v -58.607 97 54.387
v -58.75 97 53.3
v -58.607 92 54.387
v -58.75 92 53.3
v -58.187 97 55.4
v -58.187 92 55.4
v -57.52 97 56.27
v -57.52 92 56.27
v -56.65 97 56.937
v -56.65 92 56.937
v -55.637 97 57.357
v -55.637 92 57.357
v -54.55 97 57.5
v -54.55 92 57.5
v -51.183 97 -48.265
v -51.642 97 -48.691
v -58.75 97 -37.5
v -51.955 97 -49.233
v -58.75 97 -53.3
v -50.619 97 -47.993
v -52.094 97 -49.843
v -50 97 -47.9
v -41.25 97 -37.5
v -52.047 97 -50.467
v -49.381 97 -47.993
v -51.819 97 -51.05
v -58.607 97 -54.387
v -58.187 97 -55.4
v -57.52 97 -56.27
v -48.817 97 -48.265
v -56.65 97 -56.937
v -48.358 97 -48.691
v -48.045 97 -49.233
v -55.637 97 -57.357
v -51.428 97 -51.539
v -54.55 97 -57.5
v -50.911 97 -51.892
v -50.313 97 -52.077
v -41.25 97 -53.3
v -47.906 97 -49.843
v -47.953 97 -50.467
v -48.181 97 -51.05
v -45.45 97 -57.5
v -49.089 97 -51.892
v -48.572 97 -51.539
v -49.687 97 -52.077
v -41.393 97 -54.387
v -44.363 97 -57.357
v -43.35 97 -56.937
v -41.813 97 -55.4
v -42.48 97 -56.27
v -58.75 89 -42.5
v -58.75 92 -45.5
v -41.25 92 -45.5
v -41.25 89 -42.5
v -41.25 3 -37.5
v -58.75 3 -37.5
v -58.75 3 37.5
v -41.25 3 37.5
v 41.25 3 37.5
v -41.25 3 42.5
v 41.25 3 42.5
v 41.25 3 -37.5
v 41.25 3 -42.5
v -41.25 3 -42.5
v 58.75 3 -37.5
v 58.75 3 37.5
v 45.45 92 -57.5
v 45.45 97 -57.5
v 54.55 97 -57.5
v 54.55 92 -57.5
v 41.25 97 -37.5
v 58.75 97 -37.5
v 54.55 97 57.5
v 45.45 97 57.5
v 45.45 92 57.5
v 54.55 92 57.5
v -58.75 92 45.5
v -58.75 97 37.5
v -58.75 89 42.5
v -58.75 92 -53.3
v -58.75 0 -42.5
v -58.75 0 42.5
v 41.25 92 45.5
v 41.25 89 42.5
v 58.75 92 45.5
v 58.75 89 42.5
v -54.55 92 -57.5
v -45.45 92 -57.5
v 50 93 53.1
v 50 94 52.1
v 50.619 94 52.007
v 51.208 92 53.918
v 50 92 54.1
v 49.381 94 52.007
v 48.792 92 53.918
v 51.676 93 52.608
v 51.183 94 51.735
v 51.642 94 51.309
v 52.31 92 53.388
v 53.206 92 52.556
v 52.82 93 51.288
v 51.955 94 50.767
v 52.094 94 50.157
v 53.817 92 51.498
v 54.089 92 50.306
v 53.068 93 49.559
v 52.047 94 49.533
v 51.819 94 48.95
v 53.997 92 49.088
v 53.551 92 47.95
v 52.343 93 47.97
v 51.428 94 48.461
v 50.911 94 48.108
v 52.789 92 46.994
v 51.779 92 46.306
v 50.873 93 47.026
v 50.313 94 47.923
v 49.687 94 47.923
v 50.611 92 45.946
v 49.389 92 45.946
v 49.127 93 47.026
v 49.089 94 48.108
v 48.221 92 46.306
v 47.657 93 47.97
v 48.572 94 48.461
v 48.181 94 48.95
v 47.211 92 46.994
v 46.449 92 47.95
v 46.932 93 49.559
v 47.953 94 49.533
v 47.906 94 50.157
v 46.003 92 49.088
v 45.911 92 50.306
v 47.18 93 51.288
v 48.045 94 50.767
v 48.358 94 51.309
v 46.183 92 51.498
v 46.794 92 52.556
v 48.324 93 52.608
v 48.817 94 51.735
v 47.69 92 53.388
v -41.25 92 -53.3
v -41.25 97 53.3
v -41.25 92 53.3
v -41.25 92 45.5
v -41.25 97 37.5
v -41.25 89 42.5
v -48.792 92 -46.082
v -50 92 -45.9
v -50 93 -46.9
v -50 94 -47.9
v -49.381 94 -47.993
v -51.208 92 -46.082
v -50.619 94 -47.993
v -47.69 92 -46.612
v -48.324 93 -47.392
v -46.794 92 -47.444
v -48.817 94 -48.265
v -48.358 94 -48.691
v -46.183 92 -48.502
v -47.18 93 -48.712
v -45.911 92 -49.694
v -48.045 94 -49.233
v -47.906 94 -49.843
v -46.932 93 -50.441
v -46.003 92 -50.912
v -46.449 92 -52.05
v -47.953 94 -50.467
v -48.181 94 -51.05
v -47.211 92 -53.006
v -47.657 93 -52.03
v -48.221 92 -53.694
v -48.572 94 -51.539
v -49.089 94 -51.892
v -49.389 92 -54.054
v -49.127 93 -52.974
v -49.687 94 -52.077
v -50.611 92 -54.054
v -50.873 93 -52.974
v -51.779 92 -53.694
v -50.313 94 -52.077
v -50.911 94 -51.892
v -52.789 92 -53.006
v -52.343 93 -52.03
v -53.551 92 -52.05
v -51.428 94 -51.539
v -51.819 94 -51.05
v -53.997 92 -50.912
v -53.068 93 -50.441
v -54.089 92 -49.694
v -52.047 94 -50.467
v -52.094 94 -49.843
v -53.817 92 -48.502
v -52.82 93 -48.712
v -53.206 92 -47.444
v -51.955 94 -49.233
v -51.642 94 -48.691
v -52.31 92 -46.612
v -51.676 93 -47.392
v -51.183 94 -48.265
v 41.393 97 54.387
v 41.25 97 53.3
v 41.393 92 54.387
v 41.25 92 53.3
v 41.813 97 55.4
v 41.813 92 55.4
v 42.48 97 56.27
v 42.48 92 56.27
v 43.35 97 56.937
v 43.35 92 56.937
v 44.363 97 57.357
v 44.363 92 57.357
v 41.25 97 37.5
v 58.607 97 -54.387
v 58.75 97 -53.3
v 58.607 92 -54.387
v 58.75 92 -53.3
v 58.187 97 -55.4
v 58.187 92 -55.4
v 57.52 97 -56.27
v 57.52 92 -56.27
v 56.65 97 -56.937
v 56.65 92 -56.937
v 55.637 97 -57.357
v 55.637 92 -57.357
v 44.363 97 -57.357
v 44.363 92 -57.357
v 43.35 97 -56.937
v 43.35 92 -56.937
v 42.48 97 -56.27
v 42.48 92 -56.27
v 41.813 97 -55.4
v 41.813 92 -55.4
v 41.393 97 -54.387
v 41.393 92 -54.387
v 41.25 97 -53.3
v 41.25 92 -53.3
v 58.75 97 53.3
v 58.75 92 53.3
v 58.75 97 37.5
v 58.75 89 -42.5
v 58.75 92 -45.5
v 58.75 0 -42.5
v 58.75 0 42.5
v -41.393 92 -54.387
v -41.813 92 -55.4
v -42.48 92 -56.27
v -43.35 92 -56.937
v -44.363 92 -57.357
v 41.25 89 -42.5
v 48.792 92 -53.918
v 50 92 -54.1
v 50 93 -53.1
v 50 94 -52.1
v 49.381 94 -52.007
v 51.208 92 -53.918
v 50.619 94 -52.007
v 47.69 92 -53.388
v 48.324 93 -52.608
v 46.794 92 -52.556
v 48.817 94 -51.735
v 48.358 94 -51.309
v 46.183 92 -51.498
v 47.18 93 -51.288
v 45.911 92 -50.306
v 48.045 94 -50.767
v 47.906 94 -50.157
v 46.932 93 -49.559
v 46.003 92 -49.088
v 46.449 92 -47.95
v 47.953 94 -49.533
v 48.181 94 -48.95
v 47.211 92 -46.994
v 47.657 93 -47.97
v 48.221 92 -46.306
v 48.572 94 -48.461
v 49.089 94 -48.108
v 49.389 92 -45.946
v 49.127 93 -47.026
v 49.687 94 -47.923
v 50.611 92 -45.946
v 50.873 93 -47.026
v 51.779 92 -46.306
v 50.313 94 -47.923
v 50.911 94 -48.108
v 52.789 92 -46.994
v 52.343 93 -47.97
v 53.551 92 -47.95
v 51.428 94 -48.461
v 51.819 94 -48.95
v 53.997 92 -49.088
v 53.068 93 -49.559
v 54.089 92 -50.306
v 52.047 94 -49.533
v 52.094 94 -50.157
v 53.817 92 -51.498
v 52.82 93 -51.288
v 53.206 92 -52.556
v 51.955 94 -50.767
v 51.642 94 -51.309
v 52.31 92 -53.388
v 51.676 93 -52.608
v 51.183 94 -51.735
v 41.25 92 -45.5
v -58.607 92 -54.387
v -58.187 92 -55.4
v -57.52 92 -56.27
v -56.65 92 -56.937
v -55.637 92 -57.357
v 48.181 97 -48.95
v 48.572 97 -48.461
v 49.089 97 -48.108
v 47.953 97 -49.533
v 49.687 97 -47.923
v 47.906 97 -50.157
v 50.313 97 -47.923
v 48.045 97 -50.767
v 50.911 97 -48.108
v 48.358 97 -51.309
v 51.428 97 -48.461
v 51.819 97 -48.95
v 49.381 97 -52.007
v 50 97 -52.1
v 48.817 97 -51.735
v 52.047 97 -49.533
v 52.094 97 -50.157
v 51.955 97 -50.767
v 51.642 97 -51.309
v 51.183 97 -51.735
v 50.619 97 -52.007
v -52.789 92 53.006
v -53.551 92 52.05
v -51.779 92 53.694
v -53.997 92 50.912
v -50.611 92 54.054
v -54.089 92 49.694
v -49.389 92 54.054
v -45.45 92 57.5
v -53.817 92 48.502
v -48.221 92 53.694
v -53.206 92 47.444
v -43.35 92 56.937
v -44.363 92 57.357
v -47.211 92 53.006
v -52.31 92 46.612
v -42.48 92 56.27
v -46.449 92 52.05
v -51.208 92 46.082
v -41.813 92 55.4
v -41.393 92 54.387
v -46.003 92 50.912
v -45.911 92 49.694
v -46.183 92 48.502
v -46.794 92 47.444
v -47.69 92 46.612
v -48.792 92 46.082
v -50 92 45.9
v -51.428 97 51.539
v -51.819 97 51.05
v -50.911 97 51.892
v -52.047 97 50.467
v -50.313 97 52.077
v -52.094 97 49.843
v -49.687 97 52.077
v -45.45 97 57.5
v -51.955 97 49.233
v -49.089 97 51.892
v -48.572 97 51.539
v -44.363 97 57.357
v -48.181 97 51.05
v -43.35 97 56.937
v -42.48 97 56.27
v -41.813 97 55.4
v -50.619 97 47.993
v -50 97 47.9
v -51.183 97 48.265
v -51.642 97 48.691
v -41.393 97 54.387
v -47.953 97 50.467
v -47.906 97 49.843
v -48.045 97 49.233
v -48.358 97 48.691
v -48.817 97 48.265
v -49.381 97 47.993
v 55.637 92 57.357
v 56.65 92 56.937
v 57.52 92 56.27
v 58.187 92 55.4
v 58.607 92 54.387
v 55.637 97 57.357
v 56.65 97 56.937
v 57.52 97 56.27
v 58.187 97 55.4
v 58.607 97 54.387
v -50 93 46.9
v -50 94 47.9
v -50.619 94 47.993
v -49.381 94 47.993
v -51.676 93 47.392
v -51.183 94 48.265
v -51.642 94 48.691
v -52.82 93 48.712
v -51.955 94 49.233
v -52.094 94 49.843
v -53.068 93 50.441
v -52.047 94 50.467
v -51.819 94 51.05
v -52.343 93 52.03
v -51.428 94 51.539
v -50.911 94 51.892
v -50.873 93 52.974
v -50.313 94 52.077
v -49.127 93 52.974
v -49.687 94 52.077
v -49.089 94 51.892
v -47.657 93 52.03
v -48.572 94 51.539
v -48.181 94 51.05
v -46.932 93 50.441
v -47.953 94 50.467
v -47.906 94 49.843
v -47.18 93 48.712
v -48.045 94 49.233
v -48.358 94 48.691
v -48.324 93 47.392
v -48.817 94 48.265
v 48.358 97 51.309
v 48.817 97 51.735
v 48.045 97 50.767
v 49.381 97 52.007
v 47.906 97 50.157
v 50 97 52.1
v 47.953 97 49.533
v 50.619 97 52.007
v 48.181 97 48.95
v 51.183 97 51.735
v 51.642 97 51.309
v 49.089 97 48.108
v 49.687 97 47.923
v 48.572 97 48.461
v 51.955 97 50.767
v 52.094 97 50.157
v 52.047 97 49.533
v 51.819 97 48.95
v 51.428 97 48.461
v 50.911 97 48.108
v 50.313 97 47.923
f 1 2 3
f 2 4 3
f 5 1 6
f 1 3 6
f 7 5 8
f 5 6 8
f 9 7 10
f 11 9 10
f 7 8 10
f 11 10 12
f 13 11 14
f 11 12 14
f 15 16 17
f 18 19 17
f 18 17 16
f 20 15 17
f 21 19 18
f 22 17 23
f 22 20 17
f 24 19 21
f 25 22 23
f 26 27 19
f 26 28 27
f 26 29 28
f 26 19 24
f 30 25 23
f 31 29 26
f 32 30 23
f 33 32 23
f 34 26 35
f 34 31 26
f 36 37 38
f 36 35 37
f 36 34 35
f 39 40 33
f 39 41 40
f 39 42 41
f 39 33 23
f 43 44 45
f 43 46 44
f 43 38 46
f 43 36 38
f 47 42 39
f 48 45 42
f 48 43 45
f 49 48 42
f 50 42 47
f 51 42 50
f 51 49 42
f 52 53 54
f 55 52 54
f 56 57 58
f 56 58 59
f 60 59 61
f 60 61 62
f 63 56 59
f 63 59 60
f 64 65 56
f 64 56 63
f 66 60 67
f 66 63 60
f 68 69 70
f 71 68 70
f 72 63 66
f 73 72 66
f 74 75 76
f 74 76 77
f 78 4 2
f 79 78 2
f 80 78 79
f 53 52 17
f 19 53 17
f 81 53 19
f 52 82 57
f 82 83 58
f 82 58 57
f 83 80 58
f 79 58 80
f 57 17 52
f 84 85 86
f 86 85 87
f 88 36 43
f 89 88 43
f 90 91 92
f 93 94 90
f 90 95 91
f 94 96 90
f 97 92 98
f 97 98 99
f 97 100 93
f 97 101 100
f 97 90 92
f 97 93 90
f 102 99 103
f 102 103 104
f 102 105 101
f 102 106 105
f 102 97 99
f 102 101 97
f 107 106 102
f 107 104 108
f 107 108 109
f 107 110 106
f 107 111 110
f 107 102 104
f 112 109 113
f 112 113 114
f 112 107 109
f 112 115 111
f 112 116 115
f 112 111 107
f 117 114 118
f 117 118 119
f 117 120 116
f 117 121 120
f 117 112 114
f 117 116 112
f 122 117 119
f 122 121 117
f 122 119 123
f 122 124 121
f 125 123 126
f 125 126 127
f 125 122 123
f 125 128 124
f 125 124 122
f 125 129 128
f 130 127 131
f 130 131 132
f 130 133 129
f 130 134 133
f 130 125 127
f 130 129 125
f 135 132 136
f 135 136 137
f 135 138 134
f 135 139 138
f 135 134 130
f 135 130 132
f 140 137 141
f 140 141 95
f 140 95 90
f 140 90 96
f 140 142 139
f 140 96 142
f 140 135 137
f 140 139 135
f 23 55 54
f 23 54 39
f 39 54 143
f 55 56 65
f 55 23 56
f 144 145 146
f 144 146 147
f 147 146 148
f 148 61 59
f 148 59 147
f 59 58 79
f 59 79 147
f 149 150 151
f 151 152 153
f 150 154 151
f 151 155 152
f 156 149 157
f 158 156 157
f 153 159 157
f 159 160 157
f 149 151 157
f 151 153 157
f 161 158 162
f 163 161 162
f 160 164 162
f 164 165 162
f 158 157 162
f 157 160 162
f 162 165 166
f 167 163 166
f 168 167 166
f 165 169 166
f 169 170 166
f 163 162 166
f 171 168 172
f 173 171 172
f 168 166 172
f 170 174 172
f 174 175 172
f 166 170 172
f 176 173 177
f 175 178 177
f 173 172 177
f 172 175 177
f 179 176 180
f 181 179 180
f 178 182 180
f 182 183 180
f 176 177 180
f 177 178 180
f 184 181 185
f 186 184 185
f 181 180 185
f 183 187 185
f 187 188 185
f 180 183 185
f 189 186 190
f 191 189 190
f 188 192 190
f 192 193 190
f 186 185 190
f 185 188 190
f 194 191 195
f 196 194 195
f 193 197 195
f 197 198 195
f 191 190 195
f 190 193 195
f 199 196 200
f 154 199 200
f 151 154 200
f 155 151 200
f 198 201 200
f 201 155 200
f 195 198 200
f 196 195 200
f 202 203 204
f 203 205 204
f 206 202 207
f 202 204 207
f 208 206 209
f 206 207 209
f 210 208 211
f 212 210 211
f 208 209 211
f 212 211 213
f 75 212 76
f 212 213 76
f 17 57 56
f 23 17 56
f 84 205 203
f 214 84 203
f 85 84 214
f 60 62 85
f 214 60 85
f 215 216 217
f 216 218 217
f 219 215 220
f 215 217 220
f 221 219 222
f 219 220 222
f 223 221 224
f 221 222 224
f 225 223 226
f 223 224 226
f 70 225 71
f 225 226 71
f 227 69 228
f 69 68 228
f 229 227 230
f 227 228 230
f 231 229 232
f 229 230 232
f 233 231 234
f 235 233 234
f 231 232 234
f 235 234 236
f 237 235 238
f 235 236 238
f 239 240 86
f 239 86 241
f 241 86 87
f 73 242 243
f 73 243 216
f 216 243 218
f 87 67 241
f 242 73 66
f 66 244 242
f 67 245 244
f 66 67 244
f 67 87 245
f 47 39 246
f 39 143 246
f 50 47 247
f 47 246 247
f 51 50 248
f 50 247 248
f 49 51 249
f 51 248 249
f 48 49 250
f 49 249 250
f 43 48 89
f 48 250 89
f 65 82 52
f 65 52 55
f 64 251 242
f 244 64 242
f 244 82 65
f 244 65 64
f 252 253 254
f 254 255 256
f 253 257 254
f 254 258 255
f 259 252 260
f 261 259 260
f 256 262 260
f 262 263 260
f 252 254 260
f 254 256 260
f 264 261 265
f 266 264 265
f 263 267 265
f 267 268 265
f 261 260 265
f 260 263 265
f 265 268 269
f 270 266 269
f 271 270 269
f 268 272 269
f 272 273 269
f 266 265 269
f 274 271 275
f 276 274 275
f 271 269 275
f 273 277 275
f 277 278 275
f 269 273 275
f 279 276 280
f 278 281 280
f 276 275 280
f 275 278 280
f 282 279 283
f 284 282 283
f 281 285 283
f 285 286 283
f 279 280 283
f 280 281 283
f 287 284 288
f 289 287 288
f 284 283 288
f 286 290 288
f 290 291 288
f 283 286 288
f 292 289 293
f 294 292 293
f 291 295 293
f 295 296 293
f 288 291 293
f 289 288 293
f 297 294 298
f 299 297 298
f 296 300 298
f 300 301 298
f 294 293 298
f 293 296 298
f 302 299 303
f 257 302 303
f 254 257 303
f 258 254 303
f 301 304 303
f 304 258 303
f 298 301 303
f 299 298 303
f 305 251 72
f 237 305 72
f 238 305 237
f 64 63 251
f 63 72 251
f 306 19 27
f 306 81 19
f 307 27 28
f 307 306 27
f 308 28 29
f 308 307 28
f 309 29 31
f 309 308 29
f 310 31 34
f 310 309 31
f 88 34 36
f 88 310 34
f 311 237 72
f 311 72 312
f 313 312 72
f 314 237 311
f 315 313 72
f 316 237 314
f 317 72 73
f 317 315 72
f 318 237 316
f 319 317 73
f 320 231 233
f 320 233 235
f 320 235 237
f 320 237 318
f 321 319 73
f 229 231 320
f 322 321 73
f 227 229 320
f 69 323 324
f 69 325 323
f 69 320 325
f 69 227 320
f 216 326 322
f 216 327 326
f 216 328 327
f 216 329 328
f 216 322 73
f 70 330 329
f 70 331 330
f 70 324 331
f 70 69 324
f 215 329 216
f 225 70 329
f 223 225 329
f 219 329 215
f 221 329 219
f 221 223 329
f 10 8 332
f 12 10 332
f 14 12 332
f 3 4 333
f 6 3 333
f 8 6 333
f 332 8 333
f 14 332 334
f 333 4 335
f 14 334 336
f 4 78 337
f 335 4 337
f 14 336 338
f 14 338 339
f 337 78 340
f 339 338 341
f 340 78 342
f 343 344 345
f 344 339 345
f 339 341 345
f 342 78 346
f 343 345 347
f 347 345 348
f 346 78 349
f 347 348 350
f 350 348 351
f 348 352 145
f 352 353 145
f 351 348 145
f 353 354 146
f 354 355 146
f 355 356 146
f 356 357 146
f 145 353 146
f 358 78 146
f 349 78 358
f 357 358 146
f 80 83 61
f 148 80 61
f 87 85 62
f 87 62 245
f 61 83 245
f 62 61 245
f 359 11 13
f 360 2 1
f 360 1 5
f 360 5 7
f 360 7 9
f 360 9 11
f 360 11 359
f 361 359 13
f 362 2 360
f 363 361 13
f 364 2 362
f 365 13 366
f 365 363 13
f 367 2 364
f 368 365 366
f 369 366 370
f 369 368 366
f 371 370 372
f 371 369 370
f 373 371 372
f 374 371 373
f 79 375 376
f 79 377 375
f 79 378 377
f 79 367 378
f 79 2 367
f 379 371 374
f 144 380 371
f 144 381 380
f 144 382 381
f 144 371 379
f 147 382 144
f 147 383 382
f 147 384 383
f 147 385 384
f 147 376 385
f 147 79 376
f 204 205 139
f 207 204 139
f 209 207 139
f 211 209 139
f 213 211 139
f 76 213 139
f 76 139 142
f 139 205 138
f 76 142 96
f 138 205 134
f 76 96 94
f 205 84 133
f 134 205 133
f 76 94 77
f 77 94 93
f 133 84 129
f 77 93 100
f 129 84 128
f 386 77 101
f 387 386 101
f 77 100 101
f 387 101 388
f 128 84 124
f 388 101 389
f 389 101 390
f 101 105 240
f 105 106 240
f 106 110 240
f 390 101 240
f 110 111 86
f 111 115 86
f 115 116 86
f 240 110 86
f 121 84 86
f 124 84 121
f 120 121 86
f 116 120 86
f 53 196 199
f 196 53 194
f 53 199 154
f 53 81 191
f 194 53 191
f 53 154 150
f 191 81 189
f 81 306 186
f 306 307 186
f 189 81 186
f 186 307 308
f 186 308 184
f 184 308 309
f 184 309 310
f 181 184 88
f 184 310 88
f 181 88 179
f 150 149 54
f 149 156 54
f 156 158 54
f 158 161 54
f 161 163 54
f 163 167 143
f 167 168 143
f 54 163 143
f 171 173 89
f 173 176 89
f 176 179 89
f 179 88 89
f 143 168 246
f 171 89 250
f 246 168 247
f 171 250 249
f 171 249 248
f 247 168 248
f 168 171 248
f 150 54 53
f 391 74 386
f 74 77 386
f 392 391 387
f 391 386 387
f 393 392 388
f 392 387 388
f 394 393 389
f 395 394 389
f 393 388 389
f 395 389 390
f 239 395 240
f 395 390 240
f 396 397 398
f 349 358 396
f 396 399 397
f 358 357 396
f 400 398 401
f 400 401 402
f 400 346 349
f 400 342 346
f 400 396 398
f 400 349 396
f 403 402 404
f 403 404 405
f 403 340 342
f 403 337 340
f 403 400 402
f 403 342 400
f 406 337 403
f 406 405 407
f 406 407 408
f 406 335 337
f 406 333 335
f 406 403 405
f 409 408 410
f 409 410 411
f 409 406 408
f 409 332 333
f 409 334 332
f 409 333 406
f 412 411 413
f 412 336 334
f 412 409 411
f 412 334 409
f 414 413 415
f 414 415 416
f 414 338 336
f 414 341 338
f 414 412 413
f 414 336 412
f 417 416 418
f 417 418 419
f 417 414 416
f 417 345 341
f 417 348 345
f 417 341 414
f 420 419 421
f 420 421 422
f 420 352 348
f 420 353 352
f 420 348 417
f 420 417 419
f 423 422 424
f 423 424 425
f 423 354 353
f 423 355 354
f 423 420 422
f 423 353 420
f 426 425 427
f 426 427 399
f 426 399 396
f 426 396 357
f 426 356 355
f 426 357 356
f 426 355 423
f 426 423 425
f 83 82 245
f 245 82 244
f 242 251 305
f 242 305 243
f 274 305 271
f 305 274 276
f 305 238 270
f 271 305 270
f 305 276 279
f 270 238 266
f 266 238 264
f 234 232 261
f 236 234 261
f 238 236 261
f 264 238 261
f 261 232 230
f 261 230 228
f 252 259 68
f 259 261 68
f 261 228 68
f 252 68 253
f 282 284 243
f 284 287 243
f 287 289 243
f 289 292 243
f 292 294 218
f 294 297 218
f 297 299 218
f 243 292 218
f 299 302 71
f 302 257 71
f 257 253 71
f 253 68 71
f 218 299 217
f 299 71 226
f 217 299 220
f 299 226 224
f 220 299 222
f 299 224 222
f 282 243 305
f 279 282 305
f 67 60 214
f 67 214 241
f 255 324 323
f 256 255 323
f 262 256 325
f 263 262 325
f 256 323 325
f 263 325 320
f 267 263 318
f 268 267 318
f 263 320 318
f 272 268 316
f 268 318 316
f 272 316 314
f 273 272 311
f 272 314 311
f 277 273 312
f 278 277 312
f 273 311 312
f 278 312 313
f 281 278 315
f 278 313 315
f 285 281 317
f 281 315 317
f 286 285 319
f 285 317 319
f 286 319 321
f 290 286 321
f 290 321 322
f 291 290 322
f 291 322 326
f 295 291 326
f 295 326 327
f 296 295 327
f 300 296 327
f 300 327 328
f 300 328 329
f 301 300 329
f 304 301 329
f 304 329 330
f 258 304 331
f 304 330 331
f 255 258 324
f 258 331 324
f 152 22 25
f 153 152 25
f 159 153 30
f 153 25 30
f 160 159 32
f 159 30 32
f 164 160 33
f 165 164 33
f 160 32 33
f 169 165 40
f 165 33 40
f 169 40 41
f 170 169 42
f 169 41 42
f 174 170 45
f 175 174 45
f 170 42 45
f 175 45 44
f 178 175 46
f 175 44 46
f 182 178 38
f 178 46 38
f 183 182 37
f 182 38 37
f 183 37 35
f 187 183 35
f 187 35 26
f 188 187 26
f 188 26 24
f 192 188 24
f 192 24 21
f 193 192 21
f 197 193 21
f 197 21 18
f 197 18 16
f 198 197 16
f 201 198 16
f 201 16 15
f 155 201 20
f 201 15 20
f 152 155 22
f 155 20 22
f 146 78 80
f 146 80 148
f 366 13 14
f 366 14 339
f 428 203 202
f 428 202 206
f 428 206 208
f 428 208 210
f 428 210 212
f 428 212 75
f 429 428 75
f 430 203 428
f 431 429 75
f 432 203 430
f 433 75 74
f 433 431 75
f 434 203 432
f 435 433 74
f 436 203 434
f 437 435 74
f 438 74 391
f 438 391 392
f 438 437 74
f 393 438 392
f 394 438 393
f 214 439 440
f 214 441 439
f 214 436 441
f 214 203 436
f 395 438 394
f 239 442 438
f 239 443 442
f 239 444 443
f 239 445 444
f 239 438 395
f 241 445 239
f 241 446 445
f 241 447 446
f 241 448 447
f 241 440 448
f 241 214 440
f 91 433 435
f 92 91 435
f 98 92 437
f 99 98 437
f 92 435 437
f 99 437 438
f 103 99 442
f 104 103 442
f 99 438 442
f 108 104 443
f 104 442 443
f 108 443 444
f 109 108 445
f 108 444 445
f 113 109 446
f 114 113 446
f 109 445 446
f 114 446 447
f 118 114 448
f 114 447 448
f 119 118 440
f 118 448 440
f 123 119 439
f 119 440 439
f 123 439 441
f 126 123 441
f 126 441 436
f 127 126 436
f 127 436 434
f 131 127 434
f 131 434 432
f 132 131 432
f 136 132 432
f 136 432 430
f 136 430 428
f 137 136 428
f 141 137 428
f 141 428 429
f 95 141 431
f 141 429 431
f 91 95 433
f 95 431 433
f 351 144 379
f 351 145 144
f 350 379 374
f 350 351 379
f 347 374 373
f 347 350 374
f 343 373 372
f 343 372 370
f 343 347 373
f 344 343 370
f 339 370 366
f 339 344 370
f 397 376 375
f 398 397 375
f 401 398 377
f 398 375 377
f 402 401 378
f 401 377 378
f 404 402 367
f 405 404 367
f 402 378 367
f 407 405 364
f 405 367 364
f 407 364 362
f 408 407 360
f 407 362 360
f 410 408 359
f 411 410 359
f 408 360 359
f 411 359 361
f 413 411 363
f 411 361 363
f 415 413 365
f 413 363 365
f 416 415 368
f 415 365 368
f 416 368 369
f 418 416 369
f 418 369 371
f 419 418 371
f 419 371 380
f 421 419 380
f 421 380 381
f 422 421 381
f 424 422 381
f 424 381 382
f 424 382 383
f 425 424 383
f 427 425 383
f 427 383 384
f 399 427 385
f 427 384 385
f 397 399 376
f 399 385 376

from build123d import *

# Parameters (mm, degrees)
SKETCH1_W           = 117.5
SKETCH1_H           = 85
BOSS_EXTRUDE1_DEPTH = 3
SKETCH2_W           = 17.5
SKETCH2_H           = 5
BOSS_EXTRUDE2_DEPTH = 94
SKETCH3_W           = 17.5
SKETCH3_H           = 20
SKETCH3_R           = 2.1
BOSS_EXTRUDE3_DEPTH = 5
CHAMFER1_SIZE       = 2
CHAMFER2_SIZE       = 3
FILLET1_R           = 4.2


with BuildPart() as part:
    # Sketch1 → Boss-Extrude1 (new body)
    with BuildSketch(Plane(origin=(0, 0, 0), x_dir=(1, 0, 0), z_dir=(0, 1, 0))):
        Rectangle(SKETCH1_W, SKETCH1_H)
    extrude(amount=BOSS_EXTRUDE1_DEPTH)

    # Sketch2 → Boss-Extrude2 (add)
    with BuildSketch(Plane(origin=(0, 3, 0), x_dir=(1, 0, 0), z_dir=(0, 1, 0))):
        with Locations((-50, 40)):
            Rectangle(SKETCH2_W, SKETCH2_H)
        with Locations((50, 40)):
            Rectangle(SKETCH2_W, SKETCH2_H)
        with Locations((50, -40)):
            Rectangle(SKETCH2_W, SKETCH2_H)
        with Locations((-50, -40)):
            Rectangle(SKETCH2_W, SKETCH2_H)
    extrude(amount=BOSS_EXTRUDE2_DEPTH)

    # Sketch3 → Boss-Extrude3 (add)
    # profile 1 of 4: a face of its own
    with BuildSketch(Plane(origin=(0, 97, 0), x_dir=(1, 0, 0), z_dir=(0, 1, 0))):
        with Locations((-50, 47.5)):
            Rectangle(SKETCH3_W, SKETCH3_H)
        with Locations(Location((-50, 50, 0), (0, 0, 270))):
            Circle(SKETCH3_R, mode=Mode.SUBTRACT)
    # profile 2 of 4: a face of its own
    with BuildSketch(Plane(origin=(0, 97, 0), x_dir=(1, 0, 0), z_dir=(0, 1, 0))):
        with Locations((50, 47.5)):
            Rectangle(SKETCH3_W, SKETCH3_H)
        with Locations(Location((50, 50, 0), (0, 0, 90))):
            Circle(SKETCH3_R, mode=Mode.SUBTRACT)
    # profile 3 of 4: a face of its own
    with BuildSketch(Plane(origin=(0, 97, 0), x_dir=(1, 0, 0), z_dir=(0, 1, 0))):
        with Locations((50, -47.5)):
            Rectangle(SKETCH3_W, SKETCH3_H)
        with Locations(Location((50, -50, 0), (0, 0, 270))):
            Circle(SKETCH3_R, mode=Mode.SUBTRACT)
    # profile 4 of 4: a face of its own
    with BuildSketch(Plane(origin=(0, 97, 0), x_dir=(1, 0, 0), z_dir=(0, 1, 0))):
        with Locations((-50, -47.5)):
            Rectangle(SKETCH3_W, SKETCH3_H)
        with Locations(Location((-50, -50, 0), (0, 0, 90))):
            Circle(SKETCH3_R, mode=Mode.SUBTRACT)
    extrude(amount=-BOSS_EXTRUDE3_DEPTH)

    # Chamfer1
    chamfer1_edges = [part.edges().sort_by_distance(p)[0] for p in [
        (50, 92, 47.9),
        (-50, 92, 52.1),
        (-50, 92, -52.1),
        (50, 92, -47.9),
    ]]
    chamfer(chamfer1_edges, length=CHAMFER1_SIZE)

    # Chamfer2
    chamfer2_edges = [part.edges().sort_by_distance(p)[0] for p in [
        (50, 92, 42.5),
        (-50, 92, 42.5),
        (-50, 92, -42.5),
        (50, 92, -42.5),
    ]]
    chamfer(chamfer2_edges, length=CHAMFER2_SIZE)

    # Fillet1
    fillet1_edges = [part.edges().sort_by_distance(p)[0] for p in [
        (41.25, 94.5, 57.5),
        (58.75, 94.5, 57.5),
        (-58.75, 94.5, 57.5),
        (-41.25, 94.5, 57.5),
        (-41.25, 94.5, -57.5),
        (-58.75, 94.5, -57.5),
        (58.75, 94.5, -57.5),
        (41.25, 94.5, -57.5),
    ]]
    fillet(fillet1_edges, radius=FILLET1_R)


solid = part.part
